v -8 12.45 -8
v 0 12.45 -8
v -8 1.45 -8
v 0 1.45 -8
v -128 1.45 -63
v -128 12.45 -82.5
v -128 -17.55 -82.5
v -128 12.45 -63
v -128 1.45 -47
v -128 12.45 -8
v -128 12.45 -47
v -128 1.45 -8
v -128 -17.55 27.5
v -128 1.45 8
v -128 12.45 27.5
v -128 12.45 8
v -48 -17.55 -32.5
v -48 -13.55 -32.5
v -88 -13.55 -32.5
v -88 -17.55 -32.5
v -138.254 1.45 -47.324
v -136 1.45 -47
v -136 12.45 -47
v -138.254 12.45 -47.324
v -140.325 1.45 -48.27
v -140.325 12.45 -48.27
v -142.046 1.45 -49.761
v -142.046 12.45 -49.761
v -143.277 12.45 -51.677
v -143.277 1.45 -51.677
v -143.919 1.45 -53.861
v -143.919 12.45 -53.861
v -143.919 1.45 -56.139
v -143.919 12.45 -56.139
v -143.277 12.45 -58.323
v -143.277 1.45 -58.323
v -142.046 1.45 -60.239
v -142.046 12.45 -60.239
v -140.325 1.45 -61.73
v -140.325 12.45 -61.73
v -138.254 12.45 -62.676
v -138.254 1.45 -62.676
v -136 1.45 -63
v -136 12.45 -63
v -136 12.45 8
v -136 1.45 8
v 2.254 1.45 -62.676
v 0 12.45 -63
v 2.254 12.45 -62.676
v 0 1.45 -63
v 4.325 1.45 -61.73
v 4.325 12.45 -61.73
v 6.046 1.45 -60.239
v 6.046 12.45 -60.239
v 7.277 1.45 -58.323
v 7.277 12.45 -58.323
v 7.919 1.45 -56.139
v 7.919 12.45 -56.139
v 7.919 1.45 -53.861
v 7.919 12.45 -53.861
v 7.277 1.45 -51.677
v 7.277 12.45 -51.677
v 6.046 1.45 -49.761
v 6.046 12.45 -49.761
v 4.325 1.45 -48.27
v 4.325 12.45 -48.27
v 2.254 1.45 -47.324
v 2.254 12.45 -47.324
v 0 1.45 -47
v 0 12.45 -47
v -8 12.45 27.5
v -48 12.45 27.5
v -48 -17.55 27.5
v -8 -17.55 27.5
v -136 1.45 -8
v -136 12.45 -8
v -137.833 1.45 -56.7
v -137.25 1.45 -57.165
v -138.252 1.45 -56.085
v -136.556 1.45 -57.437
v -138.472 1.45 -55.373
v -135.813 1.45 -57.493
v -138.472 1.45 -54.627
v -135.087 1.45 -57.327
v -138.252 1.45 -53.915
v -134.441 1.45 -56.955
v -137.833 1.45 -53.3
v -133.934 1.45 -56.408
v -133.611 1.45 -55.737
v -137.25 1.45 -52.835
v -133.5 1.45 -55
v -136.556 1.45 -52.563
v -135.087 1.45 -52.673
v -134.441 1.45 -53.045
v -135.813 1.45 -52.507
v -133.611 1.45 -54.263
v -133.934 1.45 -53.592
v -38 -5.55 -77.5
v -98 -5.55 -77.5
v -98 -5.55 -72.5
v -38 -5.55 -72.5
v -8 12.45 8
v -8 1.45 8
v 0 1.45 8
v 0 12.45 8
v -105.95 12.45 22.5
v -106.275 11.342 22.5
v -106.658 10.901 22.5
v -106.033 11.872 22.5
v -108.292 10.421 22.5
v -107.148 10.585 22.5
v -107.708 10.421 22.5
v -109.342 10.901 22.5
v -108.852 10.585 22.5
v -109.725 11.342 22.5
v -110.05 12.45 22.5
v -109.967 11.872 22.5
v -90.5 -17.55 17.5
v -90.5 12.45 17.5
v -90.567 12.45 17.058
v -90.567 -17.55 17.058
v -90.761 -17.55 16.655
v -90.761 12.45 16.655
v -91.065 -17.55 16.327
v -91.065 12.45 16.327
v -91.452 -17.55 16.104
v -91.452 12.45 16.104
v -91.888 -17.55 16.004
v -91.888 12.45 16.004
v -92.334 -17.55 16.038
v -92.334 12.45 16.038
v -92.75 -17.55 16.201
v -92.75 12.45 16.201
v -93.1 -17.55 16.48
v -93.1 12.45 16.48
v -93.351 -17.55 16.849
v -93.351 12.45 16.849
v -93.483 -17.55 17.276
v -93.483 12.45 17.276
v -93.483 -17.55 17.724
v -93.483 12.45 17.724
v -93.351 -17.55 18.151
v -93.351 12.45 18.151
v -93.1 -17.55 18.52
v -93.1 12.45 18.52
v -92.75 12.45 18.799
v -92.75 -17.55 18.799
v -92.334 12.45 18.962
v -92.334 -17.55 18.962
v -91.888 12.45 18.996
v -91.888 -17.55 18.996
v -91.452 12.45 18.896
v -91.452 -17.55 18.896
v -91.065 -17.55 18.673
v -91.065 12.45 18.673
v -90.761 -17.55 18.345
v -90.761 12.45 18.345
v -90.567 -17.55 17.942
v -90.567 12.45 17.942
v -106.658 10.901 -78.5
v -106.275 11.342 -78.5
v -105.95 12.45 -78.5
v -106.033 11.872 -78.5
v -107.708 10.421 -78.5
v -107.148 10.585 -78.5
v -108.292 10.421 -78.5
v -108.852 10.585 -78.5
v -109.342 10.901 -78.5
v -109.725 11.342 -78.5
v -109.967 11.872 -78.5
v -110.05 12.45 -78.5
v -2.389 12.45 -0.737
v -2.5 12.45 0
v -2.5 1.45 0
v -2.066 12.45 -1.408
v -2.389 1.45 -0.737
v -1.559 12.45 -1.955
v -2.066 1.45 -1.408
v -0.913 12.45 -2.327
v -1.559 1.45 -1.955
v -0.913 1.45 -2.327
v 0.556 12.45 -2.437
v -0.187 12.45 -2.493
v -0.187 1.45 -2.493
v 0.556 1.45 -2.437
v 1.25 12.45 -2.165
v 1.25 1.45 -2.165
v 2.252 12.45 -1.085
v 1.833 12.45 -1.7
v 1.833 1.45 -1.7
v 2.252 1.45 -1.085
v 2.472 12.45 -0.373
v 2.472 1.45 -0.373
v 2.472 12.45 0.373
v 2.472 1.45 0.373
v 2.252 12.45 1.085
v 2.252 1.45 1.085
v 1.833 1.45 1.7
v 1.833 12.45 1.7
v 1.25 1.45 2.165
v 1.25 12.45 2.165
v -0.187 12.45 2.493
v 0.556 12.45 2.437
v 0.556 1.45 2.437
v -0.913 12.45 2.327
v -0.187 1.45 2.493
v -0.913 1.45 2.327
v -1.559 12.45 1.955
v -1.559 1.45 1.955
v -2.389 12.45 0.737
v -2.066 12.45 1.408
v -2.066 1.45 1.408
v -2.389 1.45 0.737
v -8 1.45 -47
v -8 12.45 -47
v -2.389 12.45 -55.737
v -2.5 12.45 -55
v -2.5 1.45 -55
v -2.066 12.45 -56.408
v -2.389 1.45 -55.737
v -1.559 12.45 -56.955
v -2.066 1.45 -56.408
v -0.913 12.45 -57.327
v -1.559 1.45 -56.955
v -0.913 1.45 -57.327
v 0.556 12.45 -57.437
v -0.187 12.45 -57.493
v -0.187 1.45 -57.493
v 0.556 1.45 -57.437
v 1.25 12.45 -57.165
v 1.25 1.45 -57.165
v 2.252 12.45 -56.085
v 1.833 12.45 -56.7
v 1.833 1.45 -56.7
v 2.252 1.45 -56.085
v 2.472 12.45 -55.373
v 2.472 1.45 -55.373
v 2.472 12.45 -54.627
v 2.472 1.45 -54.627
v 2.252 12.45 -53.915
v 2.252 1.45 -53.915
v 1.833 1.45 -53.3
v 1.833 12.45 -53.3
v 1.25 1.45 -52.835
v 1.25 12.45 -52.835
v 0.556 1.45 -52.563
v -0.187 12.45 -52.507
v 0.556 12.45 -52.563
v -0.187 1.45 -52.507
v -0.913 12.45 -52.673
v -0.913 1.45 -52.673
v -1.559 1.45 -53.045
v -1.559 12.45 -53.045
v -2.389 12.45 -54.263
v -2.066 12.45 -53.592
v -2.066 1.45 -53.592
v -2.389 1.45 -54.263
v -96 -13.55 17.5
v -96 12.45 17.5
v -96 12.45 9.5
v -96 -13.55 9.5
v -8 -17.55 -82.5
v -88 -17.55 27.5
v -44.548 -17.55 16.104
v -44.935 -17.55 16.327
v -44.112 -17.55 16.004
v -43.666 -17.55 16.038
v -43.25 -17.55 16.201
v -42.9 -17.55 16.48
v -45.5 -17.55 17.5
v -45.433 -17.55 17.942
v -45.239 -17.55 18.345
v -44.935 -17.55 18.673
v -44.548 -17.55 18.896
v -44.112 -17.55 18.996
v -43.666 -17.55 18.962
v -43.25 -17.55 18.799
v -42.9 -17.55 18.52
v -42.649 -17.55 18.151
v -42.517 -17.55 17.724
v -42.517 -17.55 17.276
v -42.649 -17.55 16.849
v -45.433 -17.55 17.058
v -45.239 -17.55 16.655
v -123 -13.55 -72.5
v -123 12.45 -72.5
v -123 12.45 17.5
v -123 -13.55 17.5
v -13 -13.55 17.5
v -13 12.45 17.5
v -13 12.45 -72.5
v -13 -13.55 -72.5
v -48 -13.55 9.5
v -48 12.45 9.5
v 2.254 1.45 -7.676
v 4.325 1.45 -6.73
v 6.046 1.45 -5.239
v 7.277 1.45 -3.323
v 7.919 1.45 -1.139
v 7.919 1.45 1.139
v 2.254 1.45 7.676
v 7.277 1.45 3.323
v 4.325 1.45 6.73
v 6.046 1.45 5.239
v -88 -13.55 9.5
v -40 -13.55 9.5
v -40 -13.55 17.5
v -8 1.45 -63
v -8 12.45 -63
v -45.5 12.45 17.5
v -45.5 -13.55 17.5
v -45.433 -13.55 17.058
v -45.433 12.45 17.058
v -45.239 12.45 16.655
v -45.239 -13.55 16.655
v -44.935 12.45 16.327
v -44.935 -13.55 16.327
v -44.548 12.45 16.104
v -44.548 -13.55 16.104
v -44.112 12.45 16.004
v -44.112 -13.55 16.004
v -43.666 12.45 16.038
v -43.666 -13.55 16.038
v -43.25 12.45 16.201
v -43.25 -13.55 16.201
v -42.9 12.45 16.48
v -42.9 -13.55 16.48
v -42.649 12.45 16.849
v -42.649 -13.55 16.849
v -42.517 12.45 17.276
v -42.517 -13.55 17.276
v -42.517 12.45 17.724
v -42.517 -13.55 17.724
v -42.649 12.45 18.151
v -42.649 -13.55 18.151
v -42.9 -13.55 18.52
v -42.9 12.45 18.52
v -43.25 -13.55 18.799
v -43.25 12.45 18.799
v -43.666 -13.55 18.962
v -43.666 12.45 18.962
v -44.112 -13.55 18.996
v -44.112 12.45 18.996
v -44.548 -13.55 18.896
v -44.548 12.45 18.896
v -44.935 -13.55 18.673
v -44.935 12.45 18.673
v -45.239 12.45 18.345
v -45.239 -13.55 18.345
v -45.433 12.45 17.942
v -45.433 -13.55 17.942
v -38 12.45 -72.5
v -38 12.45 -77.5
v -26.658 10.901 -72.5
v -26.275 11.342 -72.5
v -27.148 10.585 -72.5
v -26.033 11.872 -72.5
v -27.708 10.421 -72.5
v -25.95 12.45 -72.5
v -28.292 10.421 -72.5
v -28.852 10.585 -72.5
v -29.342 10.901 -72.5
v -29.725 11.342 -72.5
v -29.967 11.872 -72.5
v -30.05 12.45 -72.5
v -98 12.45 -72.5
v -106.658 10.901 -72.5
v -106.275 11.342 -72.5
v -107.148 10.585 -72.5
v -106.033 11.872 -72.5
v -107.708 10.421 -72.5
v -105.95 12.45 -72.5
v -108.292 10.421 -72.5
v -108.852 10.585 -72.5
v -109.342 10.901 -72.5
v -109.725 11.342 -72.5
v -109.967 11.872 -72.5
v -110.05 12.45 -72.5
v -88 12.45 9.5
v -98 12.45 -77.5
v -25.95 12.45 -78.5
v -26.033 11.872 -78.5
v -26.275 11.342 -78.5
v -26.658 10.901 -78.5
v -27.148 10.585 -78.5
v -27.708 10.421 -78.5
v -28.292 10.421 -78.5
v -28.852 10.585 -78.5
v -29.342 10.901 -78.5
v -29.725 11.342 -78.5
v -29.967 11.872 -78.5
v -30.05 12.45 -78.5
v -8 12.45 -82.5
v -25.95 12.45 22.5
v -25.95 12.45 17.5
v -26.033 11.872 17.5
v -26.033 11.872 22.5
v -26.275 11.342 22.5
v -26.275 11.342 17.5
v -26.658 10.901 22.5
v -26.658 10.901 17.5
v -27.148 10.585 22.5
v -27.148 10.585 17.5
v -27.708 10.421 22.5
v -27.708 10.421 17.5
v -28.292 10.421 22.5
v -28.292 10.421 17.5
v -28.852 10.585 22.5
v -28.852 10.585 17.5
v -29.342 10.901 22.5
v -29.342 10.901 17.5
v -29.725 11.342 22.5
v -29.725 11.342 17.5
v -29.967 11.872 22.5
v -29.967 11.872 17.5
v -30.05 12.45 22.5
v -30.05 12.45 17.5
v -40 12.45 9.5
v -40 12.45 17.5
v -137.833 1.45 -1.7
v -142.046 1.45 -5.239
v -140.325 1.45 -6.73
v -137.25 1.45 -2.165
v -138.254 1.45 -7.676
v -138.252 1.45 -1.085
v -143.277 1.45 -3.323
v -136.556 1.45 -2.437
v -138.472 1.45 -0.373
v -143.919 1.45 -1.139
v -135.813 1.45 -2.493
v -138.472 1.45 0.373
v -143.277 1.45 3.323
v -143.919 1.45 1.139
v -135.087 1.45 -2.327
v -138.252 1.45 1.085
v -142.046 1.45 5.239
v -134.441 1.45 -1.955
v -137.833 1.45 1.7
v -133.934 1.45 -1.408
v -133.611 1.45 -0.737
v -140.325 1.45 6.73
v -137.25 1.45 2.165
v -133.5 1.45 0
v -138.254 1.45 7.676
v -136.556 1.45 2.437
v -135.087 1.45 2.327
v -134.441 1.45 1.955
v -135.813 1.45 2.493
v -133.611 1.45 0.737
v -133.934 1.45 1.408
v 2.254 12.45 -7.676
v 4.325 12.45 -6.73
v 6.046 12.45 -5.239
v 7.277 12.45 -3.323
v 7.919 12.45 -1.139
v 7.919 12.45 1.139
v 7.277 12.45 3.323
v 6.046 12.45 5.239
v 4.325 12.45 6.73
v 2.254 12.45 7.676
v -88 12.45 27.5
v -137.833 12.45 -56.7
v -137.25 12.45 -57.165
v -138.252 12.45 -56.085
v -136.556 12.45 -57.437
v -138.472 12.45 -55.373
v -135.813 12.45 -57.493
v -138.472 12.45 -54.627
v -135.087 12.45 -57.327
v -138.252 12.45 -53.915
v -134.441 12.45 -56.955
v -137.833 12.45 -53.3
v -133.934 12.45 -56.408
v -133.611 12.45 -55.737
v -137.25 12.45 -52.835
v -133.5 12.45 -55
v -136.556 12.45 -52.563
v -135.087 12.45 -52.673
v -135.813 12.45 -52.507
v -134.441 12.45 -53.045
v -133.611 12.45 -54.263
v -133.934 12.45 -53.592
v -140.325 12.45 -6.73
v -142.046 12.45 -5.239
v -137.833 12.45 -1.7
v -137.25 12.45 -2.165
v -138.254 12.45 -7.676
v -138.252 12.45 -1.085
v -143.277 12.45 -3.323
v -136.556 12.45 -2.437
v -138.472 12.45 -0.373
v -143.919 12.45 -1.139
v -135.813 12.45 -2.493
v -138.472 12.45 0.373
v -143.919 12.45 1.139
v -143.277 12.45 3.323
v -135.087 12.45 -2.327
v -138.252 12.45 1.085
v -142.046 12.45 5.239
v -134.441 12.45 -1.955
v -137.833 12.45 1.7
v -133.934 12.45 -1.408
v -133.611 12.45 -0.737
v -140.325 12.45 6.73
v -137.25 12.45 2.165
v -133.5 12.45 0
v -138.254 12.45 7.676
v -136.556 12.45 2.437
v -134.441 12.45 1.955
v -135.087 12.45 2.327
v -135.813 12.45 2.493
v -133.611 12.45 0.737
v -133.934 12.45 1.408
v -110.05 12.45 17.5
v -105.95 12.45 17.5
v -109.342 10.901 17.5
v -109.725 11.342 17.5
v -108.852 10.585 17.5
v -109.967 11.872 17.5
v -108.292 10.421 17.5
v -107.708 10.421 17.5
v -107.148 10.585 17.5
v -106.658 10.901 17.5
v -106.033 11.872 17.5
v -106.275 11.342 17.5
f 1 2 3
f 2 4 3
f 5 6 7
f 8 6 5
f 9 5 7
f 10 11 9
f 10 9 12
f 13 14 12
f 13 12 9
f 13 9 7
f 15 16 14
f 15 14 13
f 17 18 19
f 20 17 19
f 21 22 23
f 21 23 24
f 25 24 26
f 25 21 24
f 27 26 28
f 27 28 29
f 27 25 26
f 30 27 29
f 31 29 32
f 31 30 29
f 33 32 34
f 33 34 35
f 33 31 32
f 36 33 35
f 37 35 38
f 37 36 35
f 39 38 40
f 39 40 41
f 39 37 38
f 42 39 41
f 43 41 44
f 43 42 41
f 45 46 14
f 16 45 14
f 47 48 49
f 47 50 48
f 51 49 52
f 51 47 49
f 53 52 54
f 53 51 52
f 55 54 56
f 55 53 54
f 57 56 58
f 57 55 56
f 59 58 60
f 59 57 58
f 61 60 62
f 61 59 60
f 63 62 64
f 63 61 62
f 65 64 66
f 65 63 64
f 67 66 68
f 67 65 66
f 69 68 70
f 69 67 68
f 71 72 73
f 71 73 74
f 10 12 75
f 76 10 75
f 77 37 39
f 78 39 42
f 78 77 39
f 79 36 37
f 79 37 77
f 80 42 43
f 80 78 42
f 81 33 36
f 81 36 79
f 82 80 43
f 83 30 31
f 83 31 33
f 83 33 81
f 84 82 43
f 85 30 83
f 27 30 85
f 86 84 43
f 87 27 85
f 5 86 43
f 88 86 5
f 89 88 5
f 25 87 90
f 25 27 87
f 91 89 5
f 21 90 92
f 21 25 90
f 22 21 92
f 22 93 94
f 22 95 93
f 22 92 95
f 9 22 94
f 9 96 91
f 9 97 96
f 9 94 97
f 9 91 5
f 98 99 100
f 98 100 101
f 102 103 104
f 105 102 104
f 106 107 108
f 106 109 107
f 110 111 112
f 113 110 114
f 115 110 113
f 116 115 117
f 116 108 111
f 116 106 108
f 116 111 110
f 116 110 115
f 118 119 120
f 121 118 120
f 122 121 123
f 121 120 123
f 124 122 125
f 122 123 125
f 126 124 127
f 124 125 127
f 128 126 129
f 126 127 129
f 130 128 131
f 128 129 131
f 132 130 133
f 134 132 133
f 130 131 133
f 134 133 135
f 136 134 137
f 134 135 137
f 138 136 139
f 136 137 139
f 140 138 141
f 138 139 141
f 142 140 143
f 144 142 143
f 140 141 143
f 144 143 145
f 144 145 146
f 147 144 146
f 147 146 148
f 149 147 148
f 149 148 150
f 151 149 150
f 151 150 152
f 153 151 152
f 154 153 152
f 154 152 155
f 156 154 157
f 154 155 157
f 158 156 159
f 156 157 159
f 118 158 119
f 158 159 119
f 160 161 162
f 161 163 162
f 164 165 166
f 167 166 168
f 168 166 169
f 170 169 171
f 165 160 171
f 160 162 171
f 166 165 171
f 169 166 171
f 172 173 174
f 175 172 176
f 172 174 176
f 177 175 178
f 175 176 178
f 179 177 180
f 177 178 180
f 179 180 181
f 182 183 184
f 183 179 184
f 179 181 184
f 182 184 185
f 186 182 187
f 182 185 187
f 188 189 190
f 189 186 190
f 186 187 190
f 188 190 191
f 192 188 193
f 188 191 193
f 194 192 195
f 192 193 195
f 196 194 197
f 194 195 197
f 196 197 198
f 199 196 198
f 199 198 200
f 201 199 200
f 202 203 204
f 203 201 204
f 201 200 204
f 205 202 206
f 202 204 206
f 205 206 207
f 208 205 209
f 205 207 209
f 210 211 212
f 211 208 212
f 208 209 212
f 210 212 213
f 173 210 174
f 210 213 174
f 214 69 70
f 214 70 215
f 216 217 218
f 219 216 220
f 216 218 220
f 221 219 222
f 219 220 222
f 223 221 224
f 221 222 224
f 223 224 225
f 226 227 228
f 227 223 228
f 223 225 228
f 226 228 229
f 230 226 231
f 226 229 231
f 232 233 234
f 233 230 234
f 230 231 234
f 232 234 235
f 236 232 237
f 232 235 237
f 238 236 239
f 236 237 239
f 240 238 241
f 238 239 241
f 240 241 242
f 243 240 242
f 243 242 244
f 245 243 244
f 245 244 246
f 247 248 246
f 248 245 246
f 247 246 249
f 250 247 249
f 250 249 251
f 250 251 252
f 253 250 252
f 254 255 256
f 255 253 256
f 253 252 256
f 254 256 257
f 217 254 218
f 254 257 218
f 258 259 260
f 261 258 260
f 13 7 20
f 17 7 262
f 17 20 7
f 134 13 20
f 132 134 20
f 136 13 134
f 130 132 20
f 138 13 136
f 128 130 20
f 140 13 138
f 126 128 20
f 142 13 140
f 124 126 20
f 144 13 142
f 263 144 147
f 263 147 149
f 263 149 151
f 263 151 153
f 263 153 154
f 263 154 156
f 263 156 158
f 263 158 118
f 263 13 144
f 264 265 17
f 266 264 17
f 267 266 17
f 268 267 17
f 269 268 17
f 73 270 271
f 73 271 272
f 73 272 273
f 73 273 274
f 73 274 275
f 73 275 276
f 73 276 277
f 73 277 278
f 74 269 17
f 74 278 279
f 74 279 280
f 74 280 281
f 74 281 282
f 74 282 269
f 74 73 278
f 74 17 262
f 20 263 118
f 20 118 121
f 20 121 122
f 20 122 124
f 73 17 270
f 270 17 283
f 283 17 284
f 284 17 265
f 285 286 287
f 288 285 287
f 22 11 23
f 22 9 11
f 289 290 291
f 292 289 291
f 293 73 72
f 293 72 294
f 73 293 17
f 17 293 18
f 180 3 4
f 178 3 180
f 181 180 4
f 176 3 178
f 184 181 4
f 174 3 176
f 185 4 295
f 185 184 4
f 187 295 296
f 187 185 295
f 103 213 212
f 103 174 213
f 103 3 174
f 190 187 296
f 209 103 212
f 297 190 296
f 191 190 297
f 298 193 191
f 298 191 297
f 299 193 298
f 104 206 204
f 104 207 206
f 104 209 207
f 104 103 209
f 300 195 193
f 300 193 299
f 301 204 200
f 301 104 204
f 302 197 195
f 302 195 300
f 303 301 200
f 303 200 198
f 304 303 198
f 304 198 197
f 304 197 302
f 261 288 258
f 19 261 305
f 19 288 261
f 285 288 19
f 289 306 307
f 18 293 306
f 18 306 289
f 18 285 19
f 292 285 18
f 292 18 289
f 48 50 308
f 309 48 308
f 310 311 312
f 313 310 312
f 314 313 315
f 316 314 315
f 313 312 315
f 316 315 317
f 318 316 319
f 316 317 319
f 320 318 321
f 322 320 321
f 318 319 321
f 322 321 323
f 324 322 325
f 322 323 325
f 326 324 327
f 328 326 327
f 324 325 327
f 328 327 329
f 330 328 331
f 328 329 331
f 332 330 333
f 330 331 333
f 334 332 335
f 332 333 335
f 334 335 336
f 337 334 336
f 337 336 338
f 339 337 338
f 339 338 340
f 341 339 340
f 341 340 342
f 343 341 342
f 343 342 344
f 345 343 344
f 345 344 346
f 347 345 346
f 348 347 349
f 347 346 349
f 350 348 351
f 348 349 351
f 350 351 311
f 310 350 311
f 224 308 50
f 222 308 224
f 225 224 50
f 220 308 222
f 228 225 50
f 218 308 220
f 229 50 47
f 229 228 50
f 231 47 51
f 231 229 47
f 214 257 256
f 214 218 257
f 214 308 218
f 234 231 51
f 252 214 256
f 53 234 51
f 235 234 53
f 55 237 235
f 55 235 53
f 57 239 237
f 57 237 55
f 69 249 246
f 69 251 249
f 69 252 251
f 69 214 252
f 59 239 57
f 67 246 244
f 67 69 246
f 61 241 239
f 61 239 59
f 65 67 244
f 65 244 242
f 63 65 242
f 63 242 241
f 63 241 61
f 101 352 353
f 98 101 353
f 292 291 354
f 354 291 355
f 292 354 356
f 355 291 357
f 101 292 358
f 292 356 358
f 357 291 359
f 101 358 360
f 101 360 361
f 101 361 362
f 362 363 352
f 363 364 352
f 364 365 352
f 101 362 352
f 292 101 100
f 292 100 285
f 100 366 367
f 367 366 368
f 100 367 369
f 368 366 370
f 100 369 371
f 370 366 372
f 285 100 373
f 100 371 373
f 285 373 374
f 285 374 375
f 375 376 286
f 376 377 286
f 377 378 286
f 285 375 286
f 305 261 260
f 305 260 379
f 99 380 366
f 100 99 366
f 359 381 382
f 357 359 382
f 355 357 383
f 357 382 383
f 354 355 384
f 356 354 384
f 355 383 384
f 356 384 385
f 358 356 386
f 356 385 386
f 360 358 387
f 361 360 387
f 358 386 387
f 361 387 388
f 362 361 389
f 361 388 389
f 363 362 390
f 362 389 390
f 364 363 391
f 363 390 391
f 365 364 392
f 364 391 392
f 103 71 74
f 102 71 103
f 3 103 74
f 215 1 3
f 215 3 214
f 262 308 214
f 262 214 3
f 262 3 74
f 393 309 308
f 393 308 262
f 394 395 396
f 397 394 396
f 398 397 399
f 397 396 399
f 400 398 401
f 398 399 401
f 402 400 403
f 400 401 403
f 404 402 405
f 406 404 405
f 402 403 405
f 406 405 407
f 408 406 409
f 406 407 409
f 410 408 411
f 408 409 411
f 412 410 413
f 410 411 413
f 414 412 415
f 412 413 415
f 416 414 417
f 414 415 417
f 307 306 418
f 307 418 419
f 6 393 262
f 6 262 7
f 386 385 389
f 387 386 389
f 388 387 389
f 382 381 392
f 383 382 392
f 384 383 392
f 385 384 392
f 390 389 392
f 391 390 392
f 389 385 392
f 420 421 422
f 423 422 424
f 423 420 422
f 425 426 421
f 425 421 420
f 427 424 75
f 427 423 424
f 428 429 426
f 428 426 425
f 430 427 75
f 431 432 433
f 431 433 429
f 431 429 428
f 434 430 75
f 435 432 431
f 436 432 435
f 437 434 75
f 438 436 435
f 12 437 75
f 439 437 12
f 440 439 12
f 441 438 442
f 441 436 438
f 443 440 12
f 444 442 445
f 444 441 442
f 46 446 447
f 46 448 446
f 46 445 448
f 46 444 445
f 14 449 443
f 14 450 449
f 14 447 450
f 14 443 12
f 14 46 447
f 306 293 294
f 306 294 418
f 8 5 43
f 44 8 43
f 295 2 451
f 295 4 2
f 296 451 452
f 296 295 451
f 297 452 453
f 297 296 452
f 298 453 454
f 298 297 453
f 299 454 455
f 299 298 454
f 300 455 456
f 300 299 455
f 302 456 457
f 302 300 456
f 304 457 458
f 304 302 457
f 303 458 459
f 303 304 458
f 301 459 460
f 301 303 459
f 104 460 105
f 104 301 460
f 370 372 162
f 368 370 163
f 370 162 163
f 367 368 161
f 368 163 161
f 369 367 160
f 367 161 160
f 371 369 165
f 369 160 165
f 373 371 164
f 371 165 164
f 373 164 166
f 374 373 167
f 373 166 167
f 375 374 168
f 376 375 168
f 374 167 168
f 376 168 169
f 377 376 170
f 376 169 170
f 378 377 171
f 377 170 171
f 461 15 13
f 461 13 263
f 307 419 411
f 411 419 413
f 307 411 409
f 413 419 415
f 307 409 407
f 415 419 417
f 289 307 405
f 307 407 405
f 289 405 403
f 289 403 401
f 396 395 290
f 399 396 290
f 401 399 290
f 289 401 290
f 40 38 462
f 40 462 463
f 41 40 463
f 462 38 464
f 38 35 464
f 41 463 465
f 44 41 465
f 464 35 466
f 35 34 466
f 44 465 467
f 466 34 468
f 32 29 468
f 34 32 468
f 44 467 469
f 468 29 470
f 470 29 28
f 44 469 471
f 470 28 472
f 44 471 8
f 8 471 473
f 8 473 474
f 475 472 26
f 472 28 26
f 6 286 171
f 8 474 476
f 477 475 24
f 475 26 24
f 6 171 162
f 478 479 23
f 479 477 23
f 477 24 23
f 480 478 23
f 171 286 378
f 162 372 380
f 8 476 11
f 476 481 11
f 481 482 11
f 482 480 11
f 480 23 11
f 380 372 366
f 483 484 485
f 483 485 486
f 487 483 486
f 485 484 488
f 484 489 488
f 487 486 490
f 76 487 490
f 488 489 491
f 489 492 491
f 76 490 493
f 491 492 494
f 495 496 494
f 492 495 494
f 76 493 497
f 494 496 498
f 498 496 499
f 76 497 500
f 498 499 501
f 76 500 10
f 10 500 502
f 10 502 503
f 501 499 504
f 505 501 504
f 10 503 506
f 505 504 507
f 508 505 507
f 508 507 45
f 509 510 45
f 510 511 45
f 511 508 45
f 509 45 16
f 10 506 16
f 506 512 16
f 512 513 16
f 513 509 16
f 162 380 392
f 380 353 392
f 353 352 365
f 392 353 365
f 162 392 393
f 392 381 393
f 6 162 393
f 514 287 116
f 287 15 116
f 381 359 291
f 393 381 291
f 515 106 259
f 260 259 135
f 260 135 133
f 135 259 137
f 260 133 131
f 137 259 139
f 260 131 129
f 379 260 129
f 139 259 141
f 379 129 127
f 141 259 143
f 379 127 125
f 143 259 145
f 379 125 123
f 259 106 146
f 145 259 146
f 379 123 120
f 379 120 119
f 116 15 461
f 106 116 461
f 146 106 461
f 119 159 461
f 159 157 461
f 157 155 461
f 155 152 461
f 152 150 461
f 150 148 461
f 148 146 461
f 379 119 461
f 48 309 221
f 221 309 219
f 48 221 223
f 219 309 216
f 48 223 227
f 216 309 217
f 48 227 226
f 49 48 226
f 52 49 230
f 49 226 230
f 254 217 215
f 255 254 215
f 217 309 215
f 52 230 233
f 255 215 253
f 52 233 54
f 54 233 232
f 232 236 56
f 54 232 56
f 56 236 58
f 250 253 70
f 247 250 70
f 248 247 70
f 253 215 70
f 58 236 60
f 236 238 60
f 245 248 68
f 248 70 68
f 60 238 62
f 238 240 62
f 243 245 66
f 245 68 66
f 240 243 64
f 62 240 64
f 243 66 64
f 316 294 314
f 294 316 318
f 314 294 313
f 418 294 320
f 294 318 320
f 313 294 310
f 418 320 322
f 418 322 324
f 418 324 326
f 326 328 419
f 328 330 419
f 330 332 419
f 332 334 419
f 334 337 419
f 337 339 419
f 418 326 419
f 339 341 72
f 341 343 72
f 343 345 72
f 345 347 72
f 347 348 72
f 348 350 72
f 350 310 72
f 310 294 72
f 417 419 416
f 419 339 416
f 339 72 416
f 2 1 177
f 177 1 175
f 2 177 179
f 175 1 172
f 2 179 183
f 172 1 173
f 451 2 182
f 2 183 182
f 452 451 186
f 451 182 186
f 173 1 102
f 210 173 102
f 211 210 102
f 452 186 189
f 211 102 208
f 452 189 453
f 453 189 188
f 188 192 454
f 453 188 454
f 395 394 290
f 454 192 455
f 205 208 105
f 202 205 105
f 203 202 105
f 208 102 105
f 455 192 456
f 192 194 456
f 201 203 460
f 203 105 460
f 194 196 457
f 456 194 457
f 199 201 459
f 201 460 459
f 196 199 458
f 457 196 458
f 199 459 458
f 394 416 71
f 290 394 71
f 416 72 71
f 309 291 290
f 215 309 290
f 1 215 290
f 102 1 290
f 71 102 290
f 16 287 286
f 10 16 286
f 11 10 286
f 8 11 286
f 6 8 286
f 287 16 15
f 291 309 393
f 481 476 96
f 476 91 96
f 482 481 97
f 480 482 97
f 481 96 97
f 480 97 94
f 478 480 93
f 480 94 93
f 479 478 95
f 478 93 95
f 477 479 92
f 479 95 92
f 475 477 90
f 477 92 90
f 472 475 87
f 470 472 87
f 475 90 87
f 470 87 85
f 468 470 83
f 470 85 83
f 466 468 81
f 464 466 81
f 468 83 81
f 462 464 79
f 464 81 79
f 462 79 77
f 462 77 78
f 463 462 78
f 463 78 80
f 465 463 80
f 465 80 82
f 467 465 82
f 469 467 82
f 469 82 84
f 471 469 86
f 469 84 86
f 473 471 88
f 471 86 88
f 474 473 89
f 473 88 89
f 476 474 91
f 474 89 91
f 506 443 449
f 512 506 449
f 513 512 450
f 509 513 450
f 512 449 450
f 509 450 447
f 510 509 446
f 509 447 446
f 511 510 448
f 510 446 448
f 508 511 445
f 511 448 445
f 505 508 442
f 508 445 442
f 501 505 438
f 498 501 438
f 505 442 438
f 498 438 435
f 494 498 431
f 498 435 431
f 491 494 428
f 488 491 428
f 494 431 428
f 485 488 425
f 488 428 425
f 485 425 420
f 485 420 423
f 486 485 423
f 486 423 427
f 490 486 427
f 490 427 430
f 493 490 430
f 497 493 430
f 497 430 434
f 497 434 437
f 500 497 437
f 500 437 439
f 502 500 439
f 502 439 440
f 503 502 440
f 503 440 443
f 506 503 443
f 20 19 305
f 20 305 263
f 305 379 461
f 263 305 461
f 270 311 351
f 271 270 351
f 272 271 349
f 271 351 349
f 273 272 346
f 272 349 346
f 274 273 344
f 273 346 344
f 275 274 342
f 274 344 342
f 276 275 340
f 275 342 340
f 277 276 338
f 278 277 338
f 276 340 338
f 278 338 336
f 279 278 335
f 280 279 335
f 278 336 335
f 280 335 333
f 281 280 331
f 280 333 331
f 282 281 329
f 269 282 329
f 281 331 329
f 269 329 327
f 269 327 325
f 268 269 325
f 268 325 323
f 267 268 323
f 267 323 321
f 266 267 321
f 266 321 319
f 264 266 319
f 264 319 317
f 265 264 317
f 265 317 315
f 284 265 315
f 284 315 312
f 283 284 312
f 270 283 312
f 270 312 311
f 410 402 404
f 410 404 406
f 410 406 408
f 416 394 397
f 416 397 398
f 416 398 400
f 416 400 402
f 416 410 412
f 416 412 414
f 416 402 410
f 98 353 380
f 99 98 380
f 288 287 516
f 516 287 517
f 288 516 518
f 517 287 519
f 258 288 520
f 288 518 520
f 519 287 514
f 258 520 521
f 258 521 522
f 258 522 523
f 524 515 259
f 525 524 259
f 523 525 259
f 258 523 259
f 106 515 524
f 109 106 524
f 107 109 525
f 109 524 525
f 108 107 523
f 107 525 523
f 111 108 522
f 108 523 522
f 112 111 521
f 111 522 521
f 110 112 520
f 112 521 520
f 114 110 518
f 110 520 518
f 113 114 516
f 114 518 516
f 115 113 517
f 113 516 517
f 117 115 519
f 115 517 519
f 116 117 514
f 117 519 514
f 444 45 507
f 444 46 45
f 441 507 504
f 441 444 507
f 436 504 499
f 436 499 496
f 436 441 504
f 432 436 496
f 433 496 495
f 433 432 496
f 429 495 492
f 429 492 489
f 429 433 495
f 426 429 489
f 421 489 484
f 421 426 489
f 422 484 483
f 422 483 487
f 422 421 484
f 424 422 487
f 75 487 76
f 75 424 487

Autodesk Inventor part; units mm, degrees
ref_plane "YZ Plane" through (0, 0, 0) normal (1, 0, 0) x (0, 1, 0)
ref_plane "XZ Plane" through (0, 0, 0) normal (0, 1, 0) x (-1, 0, 0)
ref_plane "XY Plane" through (0, 0, 0) normal (0, 0, 1) x (1, 0, 0)
sketch "Sketch1" plane through (0, 0, 0) normal (0, 1, 0) x (-1, 0, 0)
  circle A0 centre (0, 0) radius 2.5
  circle A1 centre (0, -55) radius 2.5
  arc A2 (0, 8) -> (0, -8) centre (0, 0) ccw
  arc A3 (0, -47) -> (0, -63) centre (0, -55) ccw
  line L0 (0, -63) -> (8, -63)
  line L1 (8, -63) -> (8, -47)
  line L2 (0, -47) -> (8, -47)
  line L3 (0, -8) -> (8, -8)
  line L4 (8, -8) -> (8, 8)
  line L5 (8, 8) -> (0, 8)
  line L6 (0, 2.5) -> (0, -2.5)
  line L7 (0, 0) -> (0, -2.5) construction
  line L8 (0, -8) -> (0, -49.9553) construction
  dimension "d0" = 5
  dimension "d1" = 5
  dimension "d2" = 55
  dimension "d3" = 16
  dimension "d4" = 16
extrude "Extrusion1" add sketch "Sketch1" along normal blind 12.45
sketch "Sketch3" plane through (0, 0, 0) normal (0, -1, 0) x (1, 0, 0)
  circle A0 centre (0, -55) radius 2.5 construction
  arc A1 (0, -63) -> (0, -47) centre (0, -55) ccw construction
  line L0 (0, -47) -> (-8, -47) construction
  line L1 (-8, -47) -> (-8, -63) construction
  line L2 (-8, -63) -> (0, -63) construction
  circle A2 centre (0, 0) radius 2.5 construction
  arc A3 (0, -8) -> (0, 8) centre (0, 0) ccw construction
  line L3 (0, 8) -> (-8, 8) construction
  line L4 (-8, 8) -> (-8, -8) construction
  line L5 (-8, -8) -> (0, -8) construction
  line L6 (-8, -82.5) -> (-68, -82.5)
  line L7 (-68, -82.5) -> (-68, 27.5)
  line L8 (-68, 27.5) -> (-8, 27.5)
  line L9 (-8, 27.5) -> (-8, -82.5)
  line L10 (-68, -27.5) -> (7.195, -27.5) construction
  circle A4 centre (0, 0) radius 2.5 construction
  circle A5 centre (0, -55) radius 2.5 construction
  line L11 (-8, -8) -> (-8, 8) projected
  dimension "d15" = 27.5
  dimension "d16" = 110
  dimension "d22" = 60
extrude "Extrusion3" add sketch "Sketch3" along normal blind 17.55 and the other way blind 12.45
sketch "Sketch4" plane through (0, 12.45, 0) normal (0, 1, 0) x (1, 0, 0)
  line L0 (-8, 8) -> (-8, 47) construction
  line L1 (-8, 82.5) -> (-68, 82.5) construction
  line L2 (-68, 82.5) -> (-68, -27.5) construction
  line L3 (-68, -27.5) -> (-8, -27.5) construction
  line L4 (-28, -37.155) -> (-28, 112.7267) construction
  line L5 (-28, -22.5) -> (-30.05, -22.5)
  line L6 (-30.05, -22.5) -> (-30.05, 78.5)
  line L7 (-30.05, 78.5) -> (-28, 78.5)
  line L8 (-28, 78.5) -> (-28, -22.5)
  arc A0 (0, -8) -> (0, 8) centre (0, 0) ccw projected
  line L9 (0, 8) -> (-8, 8) projected
  line L10 (-8, 47) -> (0, 47) projected
  arc A1 (0, 47) -> (0, 63) centre (0, 55) ccw projected
  line L11 (0, 63) -> (-8, 63) projected
  line L12 (-8, 63) -> (-8, 82.5) projected
  line L13 (-8, -27.5) -> (-8, -8) projected
  line L14 (-8, -8) -> (0, -8) projected
  dimension "d17" = 20
  dimension "d18" = 2.05
  dimension "d19" = 101
  dimension "d20" = 5
revolve "guide_rail_mount" cut sketch "Sketch4" angle 360 about axis through (-28, 12.45, 37.155) along (0, 0, -1)
mirror "Mirror1" about plane through (-68, 0, 27.5) normal (-1, 0, 0)
sketch "Sketch5" plane through (0, 12.45, 0) normal (0, 1, 0) x (1, 0, 0)
  line L0 (-128, 8) -> (-128, 47) construction
  line L1 (-128, 27.5) -> (-8, 27.5) construction
  line L2 (-8, 82.5) -> (-8, -27.5) construction
  line L3 (-8, -27.5) -> (-128, -27.5) construction
  line L4 (-68, -27.5) -> (-68, 82.5) construction
  line L5 (-123, -17.5) -> (-13, -17.5)
  line L6 (-13, -17.5) -> (-13, 72.5)
  line L7 (-13, 72.5) -> (-123, 72.5)
  line L8 (-123, 72.5) -> (-123, -17.5)
  point P0 (0, 0)
  dimension "d23" = 10
  dimension "d26" = 5
extrude "Extrusion4" cut sketch "Sketch5" against normal blind 26
sketch "Sketch6" plane through (0, 12.45, 0) normal (0, 1, 0) x (1, 0, 0)
  line L0 (-68, -27.5) -> (-68, 79.7854) construction
  line L1 (-88, -32.5) -> (-48, -32.5)
  line L2 (-48, -32.5) -> (-48, 32.5)
  line L3 (-48, 32.5) -> (-88, 32.5)
  line L4 (-88, 32.5) -> (-88, -32.5)
  line L5 (-8, -27.5) -> (-128, -27.5) projected
  line L6 (-105.95, 72.5) -> (-30.05, 72.5) projected
  line L7 (-68, 72.5) -> (-68, 96.7026) construction
  point P0 (0, 0)
  dimension "d27" = 5
  dimension "d28" = 60
  dimension "d29" = 40
extrude "Extrusion5" cut sketch "Sketch6" against normal through all
sketch "Sketch7" plane through (0, -13.55, 0) normal (0, 1, 0) x (1, 0, 0)
  line L0 (-88, -17.5) -> (-88, 32.5) projected
  line L1 (-88, -17.5) -> (-96, -17.5)
  line L2 (-96, -17.5) -> (-96, -9.5)
  line L3 (-96, -9.5) -> (-88, -9.5)
  line L4 (-88, -9.5) -> (-88, -17.5)
  line L5 (-88, -17.5) -> (-105.95, -17.5) projected
  circle A0 centre (-92, -17.5) radius 1.5
  point P0 (0, 0)
  dimension "d32" = 8
  dimension "d33" = 8
  dimension "d36" = 3
extrude "Extrusion6" add sketch "Sketch7" along normal blind 26 contours L1 A0 L2 L3 L0 | L1 A0 picked at (-91.8227, -17.0325)
ref_plane "Work Plane1" through (-68, -17.55, -82.5) normal (-1, 0, 0) x (0, 0, 1)
extrude "Extrusion7" cut sketch "Sketch7" along normal through all both and the other way through all contours A0 L1 | L1 A0
mirror "Mirror2" about plane through (-68, -17.55, -82.5) normal (-1, 0, 0) of "Extrusion6", "Extrusion7"
sketch "Sketch8" plane through (0, 12.45, 0) normal (0, 1, 0) x (1, 0, 0)
  line L0 (-98, 65.1826) -> (-38, 65.1826)
  line L1 (-38, 65.1826) -> (-38, 77.5)
  line L2 (-38, 77.5) -> (-98, 77.5)
  line L3 (-98, 77.5) -> (-98, 65.1826)
  line L4 (-68, -49.5) -> (-68, 104.5) construction
  line L5 (-105.95, 72.5) -> (-30.05, 72.5) construction
  point P0 (0, 0)
  dimension "d39" = 60
  dimension "d40" = 5
extrude "Extrusion8" cut sketch "Sketch8" against normal blind 18
sketch "Sketch9" plane through (0, 0, 8) normal (0, 0, 1) x (1, 0, 0)
  line L0 (0, 0) -> (-8, 0) construction
  line L1 (0, 0) -> (0, 12.45) construction
  line L2 (-8, 12.45) -> (0, 12.45) construction
  line L3 (-8, 0) -> (-8, 12.45) construction
  line L4 (-8, 0) -> (-8, 12.45) projected
  line L5 (-8, 1.45) -> (23.9687, 1.45)
  line L6 (23.9687, 1.45) -> (23.9687, -24.0835)
  line L7 (23.9687, -24.0835) -> (-8, -24.0835)
  line L8 (-8, -24.0835) -> (-8, 1.45)
  point P0 (0, 0)
  dimension "d43" = 11
extrude "limit-side-to-11mm" cut sketch "Sketch9" against normal through all
mirror "Mirror3" about plane through (-68, -17.55, -82.5) normal (-1, 0, 0) of "limit-side-to-11mm"
equation "\"d15\" = 0.25 * d16"
properties part number "PRING_piston_holder_half"
